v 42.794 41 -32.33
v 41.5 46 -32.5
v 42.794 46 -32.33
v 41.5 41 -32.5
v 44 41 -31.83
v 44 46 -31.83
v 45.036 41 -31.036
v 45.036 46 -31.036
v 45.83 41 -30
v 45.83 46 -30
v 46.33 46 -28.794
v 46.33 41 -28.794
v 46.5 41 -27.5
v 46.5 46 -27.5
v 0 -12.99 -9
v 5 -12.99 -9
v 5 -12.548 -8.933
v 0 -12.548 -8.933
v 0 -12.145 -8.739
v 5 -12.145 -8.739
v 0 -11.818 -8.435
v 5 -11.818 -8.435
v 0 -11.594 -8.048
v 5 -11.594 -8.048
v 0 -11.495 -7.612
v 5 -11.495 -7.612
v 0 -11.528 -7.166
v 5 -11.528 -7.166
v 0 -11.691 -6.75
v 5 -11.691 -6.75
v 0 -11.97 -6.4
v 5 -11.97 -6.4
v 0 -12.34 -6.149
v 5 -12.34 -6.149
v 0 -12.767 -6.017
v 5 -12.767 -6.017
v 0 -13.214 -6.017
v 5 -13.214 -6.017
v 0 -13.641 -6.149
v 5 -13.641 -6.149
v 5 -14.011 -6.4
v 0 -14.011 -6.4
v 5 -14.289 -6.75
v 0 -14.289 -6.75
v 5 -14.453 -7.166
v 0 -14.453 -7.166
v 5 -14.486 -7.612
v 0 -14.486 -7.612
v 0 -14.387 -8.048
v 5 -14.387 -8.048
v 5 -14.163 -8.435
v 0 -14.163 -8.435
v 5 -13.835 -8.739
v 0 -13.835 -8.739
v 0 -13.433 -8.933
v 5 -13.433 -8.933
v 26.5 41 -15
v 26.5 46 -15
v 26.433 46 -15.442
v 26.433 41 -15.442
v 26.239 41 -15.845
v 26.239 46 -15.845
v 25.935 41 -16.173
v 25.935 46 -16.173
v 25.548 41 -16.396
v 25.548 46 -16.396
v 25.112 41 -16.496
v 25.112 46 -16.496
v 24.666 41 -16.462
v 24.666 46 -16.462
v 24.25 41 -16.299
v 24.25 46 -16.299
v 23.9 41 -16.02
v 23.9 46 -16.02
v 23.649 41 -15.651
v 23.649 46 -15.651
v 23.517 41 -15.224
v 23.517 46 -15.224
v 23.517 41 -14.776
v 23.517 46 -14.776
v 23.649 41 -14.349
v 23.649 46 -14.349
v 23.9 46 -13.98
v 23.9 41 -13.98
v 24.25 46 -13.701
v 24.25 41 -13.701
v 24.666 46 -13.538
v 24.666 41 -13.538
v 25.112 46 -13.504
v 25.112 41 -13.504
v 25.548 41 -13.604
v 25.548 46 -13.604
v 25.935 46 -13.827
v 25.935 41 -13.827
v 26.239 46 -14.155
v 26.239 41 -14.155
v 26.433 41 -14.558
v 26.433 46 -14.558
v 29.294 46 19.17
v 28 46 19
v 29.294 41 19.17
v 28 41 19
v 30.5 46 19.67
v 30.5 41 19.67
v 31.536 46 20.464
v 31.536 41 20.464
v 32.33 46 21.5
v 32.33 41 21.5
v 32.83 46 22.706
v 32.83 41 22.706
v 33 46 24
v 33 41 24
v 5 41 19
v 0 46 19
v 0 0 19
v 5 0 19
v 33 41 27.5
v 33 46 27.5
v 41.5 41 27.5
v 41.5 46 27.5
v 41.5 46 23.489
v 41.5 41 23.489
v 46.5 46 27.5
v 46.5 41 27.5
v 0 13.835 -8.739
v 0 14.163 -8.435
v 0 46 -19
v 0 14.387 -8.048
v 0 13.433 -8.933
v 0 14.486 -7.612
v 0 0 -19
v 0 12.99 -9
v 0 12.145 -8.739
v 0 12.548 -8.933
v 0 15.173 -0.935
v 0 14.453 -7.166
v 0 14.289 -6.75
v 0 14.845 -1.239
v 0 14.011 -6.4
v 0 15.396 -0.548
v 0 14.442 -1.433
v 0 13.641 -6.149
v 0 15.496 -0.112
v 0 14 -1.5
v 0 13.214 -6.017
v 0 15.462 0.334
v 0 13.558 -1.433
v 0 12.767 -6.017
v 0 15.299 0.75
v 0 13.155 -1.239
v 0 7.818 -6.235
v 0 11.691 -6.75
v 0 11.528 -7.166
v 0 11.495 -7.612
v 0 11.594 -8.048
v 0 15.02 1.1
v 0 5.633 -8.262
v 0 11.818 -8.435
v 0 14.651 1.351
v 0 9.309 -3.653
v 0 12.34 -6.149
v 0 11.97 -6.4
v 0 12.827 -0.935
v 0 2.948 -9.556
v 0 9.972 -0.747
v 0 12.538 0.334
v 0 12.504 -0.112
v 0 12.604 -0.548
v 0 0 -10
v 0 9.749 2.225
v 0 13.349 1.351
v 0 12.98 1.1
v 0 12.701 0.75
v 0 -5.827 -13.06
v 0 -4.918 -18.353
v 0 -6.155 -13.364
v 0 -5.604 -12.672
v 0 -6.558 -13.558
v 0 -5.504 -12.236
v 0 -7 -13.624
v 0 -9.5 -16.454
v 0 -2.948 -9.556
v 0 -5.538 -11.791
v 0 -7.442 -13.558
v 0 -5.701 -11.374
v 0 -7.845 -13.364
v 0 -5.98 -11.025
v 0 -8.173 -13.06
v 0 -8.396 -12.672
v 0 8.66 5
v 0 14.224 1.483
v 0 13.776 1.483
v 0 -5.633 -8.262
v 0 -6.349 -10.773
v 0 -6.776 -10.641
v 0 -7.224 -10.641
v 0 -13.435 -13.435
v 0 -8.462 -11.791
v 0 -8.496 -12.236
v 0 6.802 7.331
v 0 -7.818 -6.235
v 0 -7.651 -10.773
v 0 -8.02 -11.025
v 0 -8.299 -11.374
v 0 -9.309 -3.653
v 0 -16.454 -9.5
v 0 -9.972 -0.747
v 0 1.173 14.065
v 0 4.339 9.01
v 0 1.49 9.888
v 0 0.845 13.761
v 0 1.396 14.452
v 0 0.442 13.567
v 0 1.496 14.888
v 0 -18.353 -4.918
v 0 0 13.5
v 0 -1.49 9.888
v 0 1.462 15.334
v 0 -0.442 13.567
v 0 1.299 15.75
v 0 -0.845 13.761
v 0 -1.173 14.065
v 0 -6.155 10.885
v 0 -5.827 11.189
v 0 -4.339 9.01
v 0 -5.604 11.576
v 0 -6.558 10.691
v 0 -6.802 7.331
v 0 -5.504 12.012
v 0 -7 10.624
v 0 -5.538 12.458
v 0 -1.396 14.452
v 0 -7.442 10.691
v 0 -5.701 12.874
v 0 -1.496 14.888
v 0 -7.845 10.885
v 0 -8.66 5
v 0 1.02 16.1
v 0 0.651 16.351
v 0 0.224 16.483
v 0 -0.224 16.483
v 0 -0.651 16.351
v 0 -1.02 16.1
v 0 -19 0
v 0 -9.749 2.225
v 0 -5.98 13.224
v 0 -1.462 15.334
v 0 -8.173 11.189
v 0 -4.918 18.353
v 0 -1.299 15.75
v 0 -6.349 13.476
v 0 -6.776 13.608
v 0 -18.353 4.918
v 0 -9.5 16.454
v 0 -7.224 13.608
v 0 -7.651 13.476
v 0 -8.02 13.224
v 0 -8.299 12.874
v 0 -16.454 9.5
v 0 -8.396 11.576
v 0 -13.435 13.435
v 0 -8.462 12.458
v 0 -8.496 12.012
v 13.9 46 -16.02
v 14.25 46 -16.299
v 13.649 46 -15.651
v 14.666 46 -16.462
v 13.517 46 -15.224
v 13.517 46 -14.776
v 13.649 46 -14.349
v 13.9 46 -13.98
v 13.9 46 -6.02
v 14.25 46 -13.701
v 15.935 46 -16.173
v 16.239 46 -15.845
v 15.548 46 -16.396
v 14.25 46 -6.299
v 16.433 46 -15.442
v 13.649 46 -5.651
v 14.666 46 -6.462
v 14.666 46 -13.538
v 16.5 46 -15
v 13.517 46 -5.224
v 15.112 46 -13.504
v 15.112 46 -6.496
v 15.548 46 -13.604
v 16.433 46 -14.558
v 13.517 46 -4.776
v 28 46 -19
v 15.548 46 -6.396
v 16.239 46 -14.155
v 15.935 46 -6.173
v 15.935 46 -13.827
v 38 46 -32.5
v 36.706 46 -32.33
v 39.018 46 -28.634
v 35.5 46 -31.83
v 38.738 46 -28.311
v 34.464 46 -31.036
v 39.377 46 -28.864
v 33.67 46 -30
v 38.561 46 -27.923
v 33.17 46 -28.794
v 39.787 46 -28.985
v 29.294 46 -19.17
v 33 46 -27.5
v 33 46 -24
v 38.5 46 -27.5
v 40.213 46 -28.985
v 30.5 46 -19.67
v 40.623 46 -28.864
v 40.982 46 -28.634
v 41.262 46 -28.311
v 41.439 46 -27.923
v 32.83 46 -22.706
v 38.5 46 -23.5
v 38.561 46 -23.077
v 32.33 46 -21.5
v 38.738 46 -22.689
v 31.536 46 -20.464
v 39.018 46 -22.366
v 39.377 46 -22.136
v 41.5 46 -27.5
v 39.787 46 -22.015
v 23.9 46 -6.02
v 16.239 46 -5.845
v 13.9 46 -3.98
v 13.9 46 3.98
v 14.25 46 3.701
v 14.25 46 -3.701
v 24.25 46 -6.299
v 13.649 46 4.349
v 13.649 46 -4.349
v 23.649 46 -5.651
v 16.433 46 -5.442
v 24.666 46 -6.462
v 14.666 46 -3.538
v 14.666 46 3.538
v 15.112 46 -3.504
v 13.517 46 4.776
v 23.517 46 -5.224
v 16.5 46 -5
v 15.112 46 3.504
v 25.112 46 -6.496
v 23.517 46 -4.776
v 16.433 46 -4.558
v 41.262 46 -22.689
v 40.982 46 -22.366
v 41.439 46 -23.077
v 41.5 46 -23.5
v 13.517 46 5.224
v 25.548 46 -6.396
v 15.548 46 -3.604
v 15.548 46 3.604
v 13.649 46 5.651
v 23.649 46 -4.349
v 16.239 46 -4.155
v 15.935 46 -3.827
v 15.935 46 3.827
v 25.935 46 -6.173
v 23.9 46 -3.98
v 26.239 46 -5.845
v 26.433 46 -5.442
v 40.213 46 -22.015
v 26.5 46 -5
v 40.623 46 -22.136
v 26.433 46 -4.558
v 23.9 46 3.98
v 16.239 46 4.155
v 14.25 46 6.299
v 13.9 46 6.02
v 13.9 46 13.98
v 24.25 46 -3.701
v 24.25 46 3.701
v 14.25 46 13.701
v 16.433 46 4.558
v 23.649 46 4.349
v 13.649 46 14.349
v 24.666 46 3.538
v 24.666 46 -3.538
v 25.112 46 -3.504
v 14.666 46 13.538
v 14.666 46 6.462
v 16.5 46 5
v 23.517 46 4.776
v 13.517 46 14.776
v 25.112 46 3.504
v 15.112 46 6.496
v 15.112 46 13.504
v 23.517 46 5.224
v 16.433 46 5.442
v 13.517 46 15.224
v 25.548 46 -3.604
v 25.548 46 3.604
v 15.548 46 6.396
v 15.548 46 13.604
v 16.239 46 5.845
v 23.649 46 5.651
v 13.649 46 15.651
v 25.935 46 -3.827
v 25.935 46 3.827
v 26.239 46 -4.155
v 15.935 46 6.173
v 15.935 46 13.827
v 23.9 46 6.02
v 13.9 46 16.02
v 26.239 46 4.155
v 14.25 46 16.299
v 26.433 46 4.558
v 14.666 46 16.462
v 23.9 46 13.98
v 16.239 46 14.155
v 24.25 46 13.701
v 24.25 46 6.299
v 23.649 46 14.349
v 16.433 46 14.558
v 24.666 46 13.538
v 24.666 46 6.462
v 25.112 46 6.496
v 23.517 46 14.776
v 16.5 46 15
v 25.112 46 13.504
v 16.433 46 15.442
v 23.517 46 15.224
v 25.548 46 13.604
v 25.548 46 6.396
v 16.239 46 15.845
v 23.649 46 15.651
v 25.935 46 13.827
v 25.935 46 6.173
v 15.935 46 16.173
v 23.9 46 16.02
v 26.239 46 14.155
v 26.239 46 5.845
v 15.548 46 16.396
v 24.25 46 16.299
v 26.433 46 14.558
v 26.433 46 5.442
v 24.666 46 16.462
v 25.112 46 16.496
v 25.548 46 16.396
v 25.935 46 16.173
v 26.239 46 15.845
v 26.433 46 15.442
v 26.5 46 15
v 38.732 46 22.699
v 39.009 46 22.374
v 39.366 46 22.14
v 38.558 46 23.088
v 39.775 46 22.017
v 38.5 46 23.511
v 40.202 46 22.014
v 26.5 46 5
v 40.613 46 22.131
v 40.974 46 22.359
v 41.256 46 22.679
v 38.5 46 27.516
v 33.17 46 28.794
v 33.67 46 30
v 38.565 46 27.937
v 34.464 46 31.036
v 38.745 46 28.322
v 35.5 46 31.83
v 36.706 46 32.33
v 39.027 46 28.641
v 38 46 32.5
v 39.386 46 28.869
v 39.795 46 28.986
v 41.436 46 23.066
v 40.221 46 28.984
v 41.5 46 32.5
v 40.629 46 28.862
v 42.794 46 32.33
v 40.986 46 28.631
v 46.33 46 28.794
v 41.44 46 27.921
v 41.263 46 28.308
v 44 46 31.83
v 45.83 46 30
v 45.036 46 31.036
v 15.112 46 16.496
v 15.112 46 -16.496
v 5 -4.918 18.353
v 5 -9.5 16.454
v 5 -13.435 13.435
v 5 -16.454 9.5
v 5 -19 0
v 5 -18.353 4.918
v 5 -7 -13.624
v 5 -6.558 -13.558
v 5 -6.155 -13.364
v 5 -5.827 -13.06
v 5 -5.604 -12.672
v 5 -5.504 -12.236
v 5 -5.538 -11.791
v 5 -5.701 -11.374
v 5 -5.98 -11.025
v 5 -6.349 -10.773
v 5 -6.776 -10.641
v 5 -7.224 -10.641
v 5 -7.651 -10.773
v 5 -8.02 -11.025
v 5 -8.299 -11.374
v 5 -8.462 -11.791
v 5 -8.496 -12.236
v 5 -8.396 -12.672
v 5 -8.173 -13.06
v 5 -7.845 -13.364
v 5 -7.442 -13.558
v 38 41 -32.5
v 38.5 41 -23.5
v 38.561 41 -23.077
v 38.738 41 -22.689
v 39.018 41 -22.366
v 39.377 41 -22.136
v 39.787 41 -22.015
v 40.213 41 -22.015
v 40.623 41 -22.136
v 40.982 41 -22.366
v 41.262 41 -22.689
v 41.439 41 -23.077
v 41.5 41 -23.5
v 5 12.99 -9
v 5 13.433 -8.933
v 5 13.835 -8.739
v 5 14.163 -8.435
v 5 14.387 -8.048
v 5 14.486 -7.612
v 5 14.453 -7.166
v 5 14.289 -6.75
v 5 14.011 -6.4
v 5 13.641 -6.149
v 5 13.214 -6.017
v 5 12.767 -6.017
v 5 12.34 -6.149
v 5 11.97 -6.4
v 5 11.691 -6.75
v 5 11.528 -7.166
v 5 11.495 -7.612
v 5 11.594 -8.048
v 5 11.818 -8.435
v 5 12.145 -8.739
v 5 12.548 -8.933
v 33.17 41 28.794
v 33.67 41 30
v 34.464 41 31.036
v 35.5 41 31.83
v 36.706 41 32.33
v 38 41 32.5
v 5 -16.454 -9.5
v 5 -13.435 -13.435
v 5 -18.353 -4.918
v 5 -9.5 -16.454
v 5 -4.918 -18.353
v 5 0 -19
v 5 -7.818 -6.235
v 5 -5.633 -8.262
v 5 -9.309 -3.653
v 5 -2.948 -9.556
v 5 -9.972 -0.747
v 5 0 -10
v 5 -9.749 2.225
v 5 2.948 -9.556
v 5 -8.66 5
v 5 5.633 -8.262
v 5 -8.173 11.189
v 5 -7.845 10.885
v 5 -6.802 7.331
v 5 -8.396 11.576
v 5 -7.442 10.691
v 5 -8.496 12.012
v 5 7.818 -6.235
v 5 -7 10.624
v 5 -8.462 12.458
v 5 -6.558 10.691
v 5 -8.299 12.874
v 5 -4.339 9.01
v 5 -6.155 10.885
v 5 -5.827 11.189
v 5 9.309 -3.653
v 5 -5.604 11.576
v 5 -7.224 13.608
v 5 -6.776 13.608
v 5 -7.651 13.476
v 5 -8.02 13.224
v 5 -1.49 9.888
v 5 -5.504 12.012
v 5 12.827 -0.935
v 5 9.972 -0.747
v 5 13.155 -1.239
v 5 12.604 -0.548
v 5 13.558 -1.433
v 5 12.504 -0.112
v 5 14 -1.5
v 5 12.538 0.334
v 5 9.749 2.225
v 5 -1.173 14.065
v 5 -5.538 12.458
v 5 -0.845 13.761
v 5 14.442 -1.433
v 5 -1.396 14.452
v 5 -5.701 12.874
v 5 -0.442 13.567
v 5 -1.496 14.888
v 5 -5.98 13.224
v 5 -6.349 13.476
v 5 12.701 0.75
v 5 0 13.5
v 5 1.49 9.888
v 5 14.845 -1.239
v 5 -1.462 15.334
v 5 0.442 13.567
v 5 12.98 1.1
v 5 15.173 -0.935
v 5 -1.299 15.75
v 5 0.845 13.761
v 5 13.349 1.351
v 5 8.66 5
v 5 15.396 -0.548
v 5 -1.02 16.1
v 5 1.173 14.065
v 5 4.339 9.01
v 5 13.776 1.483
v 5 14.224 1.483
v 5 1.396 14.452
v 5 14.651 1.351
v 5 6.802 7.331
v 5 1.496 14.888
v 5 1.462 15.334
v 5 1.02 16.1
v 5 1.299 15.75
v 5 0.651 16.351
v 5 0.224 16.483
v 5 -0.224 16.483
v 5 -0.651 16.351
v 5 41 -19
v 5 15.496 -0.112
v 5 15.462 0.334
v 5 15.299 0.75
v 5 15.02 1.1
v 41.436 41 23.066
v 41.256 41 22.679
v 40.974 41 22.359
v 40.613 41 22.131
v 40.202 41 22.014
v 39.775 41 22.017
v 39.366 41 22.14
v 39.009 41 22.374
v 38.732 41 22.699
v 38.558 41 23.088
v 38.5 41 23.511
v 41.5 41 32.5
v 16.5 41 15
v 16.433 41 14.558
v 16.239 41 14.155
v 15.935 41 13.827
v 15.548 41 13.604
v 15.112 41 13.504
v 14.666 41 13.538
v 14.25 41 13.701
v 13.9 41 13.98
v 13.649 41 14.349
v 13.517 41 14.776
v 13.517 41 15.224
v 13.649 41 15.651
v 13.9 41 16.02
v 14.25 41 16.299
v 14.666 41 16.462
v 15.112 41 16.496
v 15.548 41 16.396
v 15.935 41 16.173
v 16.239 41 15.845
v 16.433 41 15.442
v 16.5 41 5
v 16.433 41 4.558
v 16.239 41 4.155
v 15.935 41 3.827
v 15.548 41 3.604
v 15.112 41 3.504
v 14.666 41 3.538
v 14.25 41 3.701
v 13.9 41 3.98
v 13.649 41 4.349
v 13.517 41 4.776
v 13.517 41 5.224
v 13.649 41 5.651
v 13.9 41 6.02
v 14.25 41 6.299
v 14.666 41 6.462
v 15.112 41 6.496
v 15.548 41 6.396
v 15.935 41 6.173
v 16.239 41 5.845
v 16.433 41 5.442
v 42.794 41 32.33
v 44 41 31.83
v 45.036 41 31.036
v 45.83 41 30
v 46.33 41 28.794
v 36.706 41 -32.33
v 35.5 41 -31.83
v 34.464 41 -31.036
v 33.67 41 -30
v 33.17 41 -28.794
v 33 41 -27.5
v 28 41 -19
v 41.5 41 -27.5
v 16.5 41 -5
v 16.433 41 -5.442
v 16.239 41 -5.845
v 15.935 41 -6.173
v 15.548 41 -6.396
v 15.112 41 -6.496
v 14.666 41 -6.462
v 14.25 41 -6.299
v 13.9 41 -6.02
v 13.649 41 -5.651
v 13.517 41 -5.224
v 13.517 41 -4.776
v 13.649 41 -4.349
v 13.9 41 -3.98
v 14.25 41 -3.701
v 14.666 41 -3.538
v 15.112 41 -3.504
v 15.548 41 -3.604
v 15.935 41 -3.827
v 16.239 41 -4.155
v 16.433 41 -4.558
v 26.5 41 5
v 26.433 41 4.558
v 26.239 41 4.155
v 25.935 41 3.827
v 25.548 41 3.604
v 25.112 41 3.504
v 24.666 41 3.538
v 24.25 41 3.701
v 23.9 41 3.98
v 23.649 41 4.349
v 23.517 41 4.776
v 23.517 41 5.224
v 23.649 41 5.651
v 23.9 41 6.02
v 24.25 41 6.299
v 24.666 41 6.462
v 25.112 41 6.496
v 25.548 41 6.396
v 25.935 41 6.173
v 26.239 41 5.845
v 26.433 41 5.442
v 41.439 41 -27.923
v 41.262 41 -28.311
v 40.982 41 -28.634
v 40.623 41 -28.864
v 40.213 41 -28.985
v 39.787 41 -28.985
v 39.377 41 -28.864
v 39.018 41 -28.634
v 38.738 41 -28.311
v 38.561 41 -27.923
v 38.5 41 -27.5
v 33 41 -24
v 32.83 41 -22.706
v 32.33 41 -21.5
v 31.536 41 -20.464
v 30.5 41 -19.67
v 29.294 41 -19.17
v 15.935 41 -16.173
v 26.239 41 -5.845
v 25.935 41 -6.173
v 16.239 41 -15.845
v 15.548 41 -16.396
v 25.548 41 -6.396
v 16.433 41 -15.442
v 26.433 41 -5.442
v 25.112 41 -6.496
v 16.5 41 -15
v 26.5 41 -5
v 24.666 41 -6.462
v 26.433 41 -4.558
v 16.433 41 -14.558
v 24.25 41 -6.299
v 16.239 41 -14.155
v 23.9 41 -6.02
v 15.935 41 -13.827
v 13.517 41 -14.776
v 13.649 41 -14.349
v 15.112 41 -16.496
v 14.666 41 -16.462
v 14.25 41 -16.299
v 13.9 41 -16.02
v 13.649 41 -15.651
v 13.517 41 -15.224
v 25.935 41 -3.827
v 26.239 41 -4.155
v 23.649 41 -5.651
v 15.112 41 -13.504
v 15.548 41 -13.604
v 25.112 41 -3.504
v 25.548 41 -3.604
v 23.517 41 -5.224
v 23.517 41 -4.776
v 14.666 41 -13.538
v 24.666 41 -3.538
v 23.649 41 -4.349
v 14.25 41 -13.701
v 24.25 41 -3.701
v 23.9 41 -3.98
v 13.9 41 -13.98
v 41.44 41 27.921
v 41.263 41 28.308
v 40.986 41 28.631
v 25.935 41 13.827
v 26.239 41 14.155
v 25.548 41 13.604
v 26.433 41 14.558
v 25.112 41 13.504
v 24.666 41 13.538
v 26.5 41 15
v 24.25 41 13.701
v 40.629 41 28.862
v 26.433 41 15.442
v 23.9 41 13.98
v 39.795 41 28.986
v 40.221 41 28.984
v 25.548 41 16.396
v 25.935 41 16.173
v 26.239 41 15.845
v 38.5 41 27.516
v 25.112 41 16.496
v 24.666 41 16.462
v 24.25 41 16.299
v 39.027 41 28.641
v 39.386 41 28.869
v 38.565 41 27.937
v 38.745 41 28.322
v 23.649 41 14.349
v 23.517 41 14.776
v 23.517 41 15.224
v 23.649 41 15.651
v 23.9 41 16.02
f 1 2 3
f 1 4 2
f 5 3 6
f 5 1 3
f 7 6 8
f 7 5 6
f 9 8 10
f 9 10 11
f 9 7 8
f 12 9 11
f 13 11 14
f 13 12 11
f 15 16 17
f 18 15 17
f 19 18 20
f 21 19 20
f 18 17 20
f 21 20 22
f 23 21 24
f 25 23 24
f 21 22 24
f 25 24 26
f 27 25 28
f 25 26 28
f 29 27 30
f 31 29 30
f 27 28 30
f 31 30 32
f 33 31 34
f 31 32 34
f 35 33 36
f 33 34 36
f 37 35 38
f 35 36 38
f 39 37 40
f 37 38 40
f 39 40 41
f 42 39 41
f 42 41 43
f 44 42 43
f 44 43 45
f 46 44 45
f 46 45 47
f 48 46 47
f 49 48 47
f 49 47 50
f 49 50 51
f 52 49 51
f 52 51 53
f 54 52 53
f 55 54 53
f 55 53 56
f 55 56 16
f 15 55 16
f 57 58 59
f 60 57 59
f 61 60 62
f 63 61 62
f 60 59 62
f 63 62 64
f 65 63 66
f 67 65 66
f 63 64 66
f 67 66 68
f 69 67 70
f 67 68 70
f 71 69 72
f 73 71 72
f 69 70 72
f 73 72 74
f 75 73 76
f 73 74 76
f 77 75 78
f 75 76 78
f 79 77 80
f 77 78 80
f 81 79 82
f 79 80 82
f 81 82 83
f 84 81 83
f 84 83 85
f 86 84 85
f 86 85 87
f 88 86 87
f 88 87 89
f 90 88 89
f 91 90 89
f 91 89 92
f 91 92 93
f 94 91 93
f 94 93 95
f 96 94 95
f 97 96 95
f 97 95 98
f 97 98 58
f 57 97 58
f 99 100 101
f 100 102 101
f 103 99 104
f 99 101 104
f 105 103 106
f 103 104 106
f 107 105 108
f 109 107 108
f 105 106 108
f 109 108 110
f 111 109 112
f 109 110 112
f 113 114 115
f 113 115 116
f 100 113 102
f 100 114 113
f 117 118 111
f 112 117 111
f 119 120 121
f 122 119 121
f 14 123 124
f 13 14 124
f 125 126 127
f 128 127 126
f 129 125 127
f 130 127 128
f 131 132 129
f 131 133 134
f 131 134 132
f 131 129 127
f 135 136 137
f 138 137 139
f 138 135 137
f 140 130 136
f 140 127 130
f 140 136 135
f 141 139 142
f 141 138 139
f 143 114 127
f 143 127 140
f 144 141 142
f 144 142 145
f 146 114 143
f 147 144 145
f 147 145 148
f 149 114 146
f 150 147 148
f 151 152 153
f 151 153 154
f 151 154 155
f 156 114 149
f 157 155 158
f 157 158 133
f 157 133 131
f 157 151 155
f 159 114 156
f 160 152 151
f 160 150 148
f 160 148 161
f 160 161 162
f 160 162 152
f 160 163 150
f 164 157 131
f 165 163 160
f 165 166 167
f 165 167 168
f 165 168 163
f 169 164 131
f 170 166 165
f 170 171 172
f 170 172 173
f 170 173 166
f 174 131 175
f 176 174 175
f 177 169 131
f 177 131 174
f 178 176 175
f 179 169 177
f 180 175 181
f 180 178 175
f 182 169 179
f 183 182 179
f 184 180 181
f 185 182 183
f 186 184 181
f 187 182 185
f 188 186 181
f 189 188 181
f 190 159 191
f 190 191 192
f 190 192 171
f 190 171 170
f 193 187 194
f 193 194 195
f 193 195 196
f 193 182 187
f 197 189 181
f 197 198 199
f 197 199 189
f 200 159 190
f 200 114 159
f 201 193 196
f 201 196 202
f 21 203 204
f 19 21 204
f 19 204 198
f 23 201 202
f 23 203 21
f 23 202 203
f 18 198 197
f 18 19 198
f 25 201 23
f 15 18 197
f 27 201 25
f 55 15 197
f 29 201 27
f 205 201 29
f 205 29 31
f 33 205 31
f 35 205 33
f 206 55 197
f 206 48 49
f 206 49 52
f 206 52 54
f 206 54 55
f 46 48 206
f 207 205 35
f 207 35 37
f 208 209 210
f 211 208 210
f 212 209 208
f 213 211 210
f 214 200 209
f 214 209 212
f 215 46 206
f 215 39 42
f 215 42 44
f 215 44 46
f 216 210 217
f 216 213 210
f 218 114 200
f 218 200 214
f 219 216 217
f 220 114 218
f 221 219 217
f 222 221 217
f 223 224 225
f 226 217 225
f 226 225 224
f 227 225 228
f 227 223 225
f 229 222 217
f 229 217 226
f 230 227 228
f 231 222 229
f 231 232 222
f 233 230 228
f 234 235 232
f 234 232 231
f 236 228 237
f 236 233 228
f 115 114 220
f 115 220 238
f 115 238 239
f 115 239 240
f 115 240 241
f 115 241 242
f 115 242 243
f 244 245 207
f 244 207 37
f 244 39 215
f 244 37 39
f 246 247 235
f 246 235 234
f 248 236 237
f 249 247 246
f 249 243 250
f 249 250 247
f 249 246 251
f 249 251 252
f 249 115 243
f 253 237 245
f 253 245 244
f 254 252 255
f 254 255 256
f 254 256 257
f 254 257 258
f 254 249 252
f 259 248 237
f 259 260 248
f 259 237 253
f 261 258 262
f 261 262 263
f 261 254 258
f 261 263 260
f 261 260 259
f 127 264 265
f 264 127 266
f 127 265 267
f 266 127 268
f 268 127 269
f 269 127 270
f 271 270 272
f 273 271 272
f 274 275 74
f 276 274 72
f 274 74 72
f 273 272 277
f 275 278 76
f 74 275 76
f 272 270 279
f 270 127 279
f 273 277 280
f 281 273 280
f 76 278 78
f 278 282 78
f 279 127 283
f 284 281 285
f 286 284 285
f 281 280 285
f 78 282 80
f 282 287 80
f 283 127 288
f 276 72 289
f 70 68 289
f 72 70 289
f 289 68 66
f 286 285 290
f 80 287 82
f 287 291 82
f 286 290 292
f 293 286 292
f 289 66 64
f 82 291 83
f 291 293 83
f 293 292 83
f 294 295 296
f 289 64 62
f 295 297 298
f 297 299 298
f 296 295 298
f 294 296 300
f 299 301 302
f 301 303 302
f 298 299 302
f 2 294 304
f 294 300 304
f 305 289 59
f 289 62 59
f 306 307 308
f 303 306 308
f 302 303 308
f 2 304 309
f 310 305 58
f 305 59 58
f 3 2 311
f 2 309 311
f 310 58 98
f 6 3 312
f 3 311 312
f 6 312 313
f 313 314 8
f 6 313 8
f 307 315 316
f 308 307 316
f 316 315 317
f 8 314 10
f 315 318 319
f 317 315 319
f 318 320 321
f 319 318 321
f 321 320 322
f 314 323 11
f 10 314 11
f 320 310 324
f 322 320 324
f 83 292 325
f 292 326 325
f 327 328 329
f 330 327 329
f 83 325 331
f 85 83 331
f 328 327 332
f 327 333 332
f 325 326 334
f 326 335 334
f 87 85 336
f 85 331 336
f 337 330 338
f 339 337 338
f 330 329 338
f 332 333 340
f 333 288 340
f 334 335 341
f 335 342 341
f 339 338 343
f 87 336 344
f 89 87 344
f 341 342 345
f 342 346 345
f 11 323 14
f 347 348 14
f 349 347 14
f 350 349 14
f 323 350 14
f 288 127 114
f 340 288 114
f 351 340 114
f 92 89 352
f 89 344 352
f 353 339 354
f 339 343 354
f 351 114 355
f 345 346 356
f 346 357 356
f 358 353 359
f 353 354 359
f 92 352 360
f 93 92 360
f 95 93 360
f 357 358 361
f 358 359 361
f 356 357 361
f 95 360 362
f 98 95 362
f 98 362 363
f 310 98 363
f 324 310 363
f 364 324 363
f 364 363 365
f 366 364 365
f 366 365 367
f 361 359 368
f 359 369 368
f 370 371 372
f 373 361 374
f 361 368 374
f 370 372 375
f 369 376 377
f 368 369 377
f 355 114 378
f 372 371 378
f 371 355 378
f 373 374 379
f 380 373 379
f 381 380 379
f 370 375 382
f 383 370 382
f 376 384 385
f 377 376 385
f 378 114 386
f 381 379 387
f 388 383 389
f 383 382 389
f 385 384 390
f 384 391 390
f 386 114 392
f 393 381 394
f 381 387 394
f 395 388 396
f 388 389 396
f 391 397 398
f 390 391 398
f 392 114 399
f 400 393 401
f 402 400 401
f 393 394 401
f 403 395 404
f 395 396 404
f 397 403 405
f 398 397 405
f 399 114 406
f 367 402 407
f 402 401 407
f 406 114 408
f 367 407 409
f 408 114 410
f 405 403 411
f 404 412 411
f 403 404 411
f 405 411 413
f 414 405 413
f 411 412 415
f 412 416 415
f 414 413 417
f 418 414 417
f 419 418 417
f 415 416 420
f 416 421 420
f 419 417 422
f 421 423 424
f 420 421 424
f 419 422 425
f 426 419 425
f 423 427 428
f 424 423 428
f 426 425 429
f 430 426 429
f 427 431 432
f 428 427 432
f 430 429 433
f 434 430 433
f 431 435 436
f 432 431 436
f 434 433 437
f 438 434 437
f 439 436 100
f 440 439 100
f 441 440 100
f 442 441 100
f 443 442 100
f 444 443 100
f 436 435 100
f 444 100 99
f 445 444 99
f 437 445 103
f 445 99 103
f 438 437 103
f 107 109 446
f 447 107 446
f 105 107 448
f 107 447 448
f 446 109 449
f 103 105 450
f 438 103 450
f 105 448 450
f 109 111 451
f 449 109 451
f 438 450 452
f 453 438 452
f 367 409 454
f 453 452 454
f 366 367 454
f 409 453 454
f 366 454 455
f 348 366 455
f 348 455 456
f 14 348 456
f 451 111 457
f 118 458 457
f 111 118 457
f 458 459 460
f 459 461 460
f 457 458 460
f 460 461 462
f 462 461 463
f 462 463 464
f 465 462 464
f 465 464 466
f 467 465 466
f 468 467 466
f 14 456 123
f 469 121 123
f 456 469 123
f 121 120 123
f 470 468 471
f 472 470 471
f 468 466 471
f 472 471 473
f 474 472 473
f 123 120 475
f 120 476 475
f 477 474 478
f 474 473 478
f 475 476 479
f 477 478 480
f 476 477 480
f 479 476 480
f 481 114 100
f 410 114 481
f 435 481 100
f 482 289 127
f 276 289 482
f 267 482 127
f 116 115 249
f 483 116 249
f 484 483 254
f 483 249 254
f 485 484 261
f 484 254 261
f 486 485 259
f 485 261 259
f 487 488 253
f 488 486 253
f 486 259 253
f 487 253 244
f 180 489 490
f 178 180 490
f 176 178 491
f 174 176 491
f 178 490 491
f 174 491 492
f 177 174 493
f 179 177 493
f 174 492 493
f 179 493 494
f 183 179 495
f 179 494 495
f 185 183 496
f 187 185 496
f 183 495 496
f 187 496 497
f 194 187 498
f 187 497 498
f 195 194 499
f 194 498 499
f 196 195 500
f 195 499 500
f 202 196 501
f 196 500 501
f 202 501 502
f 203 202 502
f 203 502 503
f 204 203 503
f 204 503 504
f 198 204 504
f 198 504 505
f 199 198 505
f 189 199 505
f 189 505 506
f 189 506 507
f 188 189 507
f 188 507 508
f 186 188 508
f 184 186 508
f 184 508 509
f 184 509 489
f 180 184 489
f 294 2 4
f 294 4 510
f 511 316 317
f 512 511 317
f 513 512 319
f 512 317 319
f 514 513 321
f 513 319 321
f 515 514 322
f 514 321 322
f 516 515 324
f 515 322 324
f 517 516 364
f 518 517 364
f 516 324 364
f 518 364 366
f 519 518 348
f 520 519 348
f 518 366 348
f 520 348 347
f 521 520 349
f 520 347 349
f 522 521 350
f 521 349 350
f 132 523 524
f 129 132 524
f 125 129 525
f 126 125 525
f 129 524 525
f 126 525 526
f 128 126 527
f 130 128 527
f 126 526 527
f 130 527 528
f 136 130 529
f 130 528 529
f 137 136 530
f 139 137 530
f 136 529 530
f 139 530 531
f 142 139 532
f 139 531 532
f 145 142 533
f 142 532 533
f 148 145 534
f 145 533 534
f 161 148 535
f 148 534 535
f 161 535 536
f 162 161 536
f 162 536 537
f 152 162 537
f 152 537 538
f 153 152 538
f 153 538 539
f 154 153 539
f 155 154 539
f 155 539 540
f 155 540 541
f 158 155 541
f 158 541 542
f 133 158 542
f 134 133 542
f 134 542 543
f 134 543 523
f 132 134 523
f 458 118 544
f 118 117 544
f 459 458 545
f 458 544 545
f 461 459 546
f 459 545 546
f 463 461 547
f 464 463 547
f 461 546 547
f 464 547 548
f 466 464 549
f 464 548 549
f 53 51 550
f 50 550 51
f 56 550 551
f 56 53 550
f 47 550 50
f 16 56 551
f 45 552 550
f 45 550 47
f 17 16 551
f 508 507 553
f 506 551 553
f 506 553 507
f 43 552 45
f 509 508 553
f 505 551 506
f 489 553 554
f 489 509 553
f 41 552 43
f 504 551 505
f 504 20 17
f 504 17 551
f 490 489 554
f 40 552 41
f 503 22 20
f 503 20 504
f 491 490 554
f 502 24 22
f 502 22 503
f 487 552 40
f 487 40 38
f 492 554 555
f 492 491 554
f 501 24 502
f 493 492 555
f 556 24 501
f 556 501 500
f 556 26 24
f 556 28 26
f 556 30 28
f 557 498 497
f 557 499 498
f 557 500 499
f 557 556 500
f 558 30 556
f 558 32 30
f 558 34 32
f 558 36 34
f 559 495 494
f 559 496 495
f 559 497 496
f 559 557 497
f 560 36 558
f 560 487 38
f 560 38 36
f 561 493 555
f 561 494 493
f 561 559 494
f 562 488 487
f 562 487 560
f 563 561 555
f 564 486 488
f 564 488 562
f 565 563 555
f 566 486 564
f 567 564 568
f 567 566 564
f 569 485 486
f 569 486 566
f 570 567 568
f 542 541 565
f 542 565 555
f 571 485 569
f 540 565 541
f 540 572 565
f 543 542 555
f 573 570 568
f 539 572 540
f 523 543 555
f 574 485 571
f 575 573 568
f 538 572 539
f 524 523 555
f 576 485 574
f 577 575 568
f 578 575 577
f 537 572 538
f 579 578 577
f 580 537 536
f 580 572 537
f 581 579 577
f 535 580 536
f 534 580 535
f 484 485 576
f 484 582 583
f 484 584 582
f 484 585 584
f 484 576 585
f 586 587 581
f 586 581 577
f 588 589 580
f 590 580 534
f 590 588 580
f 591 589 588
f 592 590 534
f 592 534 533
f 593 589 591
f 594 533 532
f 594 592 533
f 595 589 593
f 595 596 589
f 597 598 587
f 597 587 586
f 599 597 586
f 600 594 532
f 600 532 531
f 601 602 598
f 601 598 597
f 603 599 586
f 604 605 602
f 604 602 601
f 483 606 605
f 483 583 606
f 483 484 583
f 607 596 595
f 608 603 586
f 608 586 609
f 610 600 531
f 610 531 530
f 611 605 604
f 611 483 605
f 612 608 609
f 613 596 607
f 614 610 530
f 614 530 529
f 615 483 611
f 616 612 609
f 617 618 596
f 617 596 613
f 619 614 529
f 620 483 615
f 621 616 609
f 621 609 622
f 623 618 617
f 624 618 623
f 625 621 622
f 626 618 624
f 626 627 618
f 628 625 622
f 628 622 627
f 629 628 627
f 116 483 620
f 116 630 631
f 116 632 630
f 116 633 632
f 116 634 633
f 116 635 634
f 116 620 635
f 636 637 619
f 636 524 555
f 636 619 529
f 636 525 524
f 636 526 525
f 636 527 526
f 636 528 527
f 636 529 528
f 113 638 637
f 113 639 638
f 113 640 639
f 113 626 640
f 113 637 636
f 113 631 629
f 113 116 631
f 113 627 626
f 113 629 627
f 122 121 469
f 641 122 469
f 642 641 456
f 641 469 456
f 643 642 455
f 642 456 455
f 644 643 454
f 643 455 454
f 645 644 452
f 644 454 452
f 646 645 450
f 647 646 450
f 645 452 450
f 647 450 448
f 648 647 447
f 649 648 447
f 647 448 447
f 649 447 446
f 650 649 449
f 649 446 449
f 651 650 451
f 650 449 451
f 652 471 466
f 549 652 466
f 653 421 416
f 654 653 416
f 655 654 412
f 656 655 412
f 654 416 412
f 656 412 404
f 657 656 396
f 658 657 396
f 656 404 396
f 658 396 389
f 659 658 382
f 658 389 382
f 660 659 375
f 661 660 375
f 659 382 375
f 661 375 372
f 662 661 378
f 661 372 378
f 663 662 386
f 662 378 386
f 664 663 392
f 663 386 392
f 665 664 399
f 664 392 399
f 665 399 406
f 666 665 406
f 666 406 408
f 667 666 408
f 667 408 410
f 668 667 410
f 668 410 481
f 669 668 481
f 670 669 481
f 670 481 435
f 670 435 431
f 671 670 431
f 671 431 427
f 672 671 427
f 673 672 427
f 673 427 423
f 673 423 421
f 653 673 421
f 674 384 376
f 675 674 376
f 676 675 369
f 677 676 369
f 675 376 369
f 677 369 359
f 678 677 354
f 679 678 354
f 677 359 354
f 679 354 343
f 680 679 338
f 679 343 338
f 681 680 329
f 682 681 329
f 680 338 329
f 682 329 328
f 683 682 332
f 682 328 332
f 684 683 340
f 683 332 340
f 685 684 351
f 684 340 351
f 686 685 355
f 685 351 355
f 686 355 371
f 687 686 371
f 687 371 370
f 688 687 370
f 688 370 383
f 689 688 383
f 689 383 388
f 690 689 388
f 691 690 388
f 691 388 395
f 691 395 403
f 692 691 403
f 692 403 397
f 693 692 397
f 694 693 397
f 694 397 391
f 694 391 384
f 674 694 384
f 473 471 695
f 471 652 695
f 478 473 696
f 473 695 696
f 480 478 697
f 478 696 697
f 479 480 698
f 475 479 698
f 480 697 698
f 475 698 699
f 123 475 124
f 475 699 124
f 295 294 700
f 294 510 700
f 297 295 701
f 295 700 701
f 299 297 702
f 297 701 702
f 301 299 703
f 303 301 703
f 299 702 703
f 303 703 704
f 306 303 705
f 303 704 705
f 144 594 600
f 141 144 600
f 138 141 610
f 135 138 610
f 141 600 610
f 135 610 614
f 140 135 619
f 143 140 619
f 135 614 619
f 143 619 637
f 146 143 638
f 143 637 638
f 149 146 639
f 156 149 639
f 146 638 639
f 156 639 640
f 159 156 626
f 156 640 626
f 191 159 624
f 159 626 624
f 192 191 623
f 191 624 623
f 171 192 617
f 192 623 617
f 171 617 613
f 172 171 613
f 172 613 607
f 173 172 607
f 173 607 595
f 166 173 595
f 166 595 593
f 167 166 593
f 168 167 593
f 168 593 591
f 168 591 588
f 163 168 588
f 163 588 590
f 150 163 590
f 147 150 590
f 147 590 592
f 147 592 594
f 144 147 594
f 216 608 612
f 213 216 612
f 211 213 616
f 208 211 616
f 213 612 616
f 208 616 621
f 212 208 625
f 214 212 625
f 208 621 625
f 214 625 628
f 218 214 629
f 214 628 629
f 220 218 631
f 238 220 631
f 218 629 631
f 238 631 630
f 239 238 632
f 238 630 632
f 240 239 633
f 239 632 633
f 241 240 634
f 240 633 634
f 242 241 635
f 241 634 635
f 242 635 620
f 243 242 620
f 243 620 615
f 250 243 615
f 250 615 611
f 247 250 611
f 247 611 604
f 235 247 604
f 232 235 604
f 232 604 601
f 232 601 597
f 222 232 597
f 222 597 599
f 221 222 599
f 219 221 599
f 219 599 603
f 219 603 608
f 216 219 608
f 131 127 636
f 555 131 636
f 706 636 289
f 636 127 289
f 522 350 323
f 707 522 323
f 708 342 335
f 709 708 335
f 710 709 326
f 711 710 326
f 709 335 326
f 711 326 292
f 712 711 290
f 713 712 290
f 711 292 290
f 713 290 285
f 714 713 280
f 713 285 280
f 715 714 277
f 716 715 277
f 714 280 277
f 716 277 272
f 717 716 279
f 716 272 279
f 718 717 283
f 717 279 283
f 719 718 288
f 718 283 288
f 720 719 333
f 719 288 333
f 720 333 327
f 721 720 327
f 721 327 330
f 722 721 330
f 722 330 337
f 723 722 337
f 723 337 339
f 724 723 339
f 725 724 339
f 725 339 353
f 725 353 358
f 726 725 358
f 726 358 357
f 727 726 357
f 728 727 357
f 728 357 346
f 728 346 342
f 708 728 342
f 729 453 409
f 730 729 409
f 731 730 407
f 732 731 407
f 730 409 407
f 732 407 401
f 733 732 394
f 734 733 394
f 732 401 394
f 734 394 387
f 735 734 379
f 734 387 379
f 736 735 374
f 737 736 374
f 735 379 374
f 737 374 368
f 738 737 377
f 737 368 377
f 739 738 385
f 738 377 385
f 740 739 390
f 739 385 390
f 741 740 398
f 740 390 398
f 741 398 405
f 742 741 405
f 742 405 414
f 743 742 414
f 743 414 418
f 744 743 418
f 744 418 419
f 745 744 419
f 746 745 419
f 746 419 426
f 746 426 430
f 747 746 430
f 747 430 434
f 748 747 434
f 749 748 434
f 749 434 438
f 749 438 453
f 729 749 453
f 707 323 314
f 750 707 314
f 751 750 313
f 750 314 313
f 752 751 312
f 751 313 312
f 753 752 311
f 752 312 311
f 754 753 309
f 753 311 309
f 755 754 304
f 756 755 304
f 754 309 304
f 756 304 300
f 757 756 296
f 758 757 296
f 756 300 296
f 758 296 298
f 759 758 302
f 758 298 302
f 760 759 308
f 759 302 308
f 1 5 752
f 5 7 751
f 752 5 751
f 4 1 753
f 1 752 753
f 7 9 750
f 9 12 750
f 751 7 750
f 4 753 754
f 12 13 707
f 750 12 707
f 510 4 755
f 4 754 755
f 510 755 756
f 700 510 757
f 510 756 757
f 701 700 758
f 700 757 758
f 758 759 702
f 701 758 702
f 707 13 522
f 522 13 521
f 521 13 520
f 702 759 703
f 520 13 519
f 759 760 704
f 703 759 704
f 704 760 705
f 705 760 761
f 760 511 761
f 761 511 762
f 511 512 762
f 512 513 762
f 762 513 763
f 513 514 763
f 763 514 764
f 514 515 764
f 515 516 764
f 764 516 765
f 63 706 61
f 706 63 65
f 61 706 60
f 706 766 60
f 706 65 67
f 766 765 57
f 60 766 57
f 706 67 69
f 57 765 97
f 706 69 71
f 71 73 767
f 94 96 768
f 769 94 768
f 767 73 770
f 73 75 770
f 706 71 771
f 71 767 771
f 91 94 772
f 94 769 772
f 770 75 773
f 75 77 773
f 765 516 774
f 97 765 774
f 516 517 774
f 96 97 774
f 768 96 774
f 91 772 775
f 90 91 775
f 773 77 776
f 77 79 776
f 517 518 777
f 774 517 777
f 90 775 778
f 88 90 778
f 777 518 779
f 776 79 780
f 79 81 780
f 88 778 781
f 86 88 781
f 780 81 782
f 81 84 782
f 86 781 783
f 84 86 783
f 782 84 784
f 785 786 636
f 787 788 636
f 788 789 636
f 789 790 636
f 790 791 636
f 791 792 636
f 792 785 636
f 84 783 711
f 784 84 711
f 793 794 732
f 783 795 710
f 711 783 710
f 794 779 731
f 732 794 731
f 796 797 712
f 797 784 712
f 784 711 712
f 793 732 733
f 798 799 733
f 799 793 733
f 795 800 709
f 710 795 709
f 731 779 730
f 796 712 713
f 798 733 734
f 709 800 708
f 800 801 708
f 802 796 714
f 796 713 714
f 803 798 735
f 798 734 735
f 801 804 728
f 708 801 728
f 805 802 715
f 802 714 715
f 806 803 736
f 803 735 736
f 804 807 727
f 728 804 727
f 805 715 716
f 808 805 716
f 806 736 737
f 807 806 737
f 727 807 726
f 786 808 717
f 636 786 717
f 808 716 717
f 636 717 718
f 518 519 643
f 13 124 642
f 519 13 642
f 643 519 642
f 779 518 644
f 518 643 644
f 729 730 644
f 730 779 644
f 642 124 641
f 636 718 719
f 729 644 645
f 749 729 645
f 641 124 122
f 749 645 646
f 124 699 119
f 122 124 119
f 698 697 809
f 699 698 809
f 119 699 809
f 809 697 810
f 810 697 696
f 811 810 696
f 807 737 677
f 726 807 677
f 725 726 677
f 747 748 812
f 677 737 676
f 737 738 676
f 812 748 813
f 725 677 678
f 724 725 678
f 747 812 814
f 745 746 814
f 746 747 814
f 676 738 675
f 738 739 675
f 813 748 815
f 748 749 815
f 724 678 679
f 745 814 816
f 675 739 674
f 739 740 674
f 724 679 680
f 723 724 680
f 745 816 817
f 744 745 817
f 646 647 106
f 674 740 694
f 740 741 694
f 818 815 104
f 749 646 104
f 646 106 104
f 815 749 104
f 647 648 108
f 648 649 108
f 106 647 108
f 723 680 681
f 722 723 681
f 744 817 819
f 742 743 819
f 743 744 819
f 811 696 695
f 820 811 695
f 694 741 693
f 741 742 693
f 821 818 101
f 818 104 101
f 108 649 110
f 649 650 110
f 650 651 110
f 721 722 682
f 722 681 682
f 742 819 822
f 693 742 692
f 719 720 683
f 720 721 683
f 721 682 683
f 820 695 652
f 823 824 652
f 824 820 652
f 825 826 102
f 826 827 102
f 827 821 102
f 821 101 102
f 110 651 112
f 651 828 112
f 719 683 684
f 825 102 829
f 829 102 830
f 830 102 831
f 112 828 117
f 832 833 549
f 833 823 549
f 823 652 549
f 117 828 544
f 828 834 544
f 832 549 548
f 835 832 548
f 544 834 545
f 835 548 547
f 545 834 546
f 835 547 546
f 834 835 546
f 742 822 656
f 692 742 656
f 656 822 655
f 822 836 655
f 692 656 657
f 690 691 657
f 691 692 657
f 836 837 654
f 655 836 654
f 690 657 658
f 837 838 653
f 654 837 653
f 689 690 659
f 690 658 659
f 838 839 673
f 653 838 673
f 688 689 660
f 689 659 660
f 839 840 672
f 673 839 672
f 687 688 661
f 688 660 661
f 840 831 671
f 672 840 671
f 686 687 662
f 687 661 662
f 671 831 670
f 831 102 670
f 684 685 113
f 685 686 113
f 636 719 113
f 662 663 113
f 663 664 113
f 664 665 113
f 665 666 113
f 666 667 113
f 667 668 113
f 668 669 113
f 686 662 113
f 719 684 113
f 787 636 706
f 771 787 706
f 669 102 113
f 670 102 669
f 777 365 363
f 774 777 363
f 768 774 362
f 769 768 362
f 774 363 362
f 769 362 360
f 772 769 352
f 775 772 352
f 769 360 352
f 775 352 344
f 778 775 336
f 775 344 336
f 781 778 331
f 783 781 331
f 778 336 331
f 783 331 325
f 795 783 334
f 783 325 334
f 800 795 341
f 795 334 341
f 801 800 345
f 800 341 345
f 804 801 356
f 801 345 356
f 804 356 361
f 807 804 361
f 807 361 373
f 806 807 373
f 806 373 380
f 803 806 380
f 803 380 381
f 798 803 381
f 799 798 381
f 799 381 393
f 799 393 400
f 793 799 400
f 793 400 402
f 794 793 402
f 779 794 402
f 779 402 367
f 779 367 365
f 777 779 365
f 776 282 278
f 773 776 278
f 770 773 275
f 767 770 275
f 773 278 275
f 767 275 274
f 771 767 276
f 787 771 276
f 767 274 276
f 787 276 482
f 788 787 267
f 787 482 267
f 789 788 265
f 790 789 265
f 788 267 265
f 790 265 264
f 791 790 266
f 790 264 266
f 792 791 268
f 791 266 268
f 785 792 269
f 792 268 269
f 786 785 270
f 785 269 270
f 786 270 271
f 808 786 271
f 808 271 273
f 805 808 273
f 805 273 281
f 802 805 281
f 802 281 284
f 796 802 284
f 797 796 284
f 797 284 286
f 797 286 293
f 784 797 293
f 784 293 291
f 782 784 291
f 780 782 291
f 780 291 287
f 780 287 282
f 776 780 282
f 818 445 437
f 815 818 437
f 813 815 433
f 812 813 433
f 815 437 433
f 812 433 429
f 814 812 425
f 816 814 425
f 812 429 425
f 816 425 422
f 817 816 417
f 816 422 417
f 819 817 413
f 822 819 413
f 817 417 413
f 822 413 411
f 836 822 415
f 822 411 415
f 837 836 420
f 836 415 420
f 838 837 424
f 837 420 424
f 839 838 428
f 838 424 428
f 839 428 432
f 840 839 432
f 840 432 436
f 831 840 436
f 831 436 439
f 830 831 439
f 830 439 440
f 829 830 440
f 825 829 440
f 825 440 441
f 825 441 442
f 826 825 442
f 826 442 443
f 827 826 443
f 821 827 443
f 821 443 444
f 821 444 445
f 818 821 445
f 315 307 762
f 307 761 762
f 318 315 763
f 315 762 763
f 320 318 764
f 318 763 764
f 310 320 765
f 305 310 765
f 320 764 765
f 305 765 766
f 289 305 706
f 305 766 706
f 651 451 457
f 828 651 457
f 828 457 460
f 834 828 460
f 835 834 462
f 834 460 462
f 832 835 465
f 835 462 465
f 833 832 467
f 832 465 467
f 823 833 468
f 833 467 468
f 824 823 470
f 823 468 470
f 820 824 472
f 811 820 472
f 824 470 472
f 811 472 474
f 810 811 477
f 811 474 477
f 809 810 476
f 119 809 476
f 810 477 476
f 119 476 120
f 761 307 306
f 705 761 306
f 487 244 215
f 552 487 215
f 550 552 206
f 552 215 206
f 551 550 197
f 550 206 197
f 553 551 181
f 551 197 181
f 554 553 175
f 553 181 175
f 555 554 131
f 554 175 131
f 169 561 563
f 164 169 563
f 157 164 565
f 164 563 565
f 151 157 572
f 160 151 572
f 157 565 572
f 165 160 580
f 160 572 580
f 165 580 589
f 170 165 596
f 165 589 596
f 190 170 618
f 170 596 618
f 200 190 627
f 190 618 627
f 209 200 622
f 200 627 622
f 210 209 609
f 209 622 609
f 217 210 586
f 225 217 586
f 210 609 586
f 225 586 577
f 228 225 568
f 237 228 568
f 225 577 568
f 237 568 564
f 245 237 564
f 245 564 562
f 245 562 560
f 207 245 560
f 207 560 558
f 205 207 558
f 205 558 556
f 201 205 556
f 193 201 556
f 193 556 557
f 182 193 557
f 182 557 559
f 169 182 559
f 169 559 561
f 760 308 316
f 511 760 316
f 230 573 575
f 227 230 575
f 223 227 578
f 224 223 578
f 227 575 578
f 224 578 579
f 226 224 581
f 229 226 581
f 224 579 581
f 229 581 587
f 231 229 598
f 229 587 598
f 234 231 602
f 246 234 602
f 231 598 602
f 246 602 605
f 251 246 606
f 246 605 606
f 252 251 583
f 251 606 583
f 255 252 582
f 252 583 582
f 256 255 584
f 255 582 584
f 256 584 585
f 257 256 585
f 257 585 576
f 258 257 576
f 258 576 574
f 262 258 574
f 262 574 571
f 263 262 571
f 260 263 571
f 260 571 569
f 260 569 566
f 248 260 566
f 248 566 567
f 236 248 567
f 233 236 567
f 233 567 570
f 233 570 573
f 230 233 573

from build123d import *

# Parameters (mm, degrees)
SKETCH_1_W               = 5
SKETCH_1_H               = 19
EXTRUDE_1_DEPTH          = 32.5
EXTRUDE_1_DEPTH_BACK     = 32.5
SKETCH_2_R               = 10
CUT_EXTRUDE_1_DEPTH      = 19
SKETCH_3_R               = 1.5
CUT_EXTRUDE_2_DEPTH      = 6
SKETCH_4_R               = 1.5
CUT_EXTRUDE_3_DEPTH      = 66
CUT_EXTRUDE_4_DEPTH      = 1
CUT_EXTRUDE_4_DEPTH_BACK = 47.5
SKETCH_6_W               = 33
SKETCH_6_H               = 13.5
CUT_EXTRUDE_5_DEPTH      = 10
FILLET_3_R               = 5


with BuildPart() as part:
    # Эскиз1 → Бобышка-Вытянуть1 (new body, two sides)
    with BuildSketch(Plane.XY) as extrude_1_sk:
        Polygon((46.5, 41), (5, 41), (5, 0), (0, 0), (0, 46), (46.5, 46), align=None)
        with Locations((2.5, -9.5)):
            Rectangle(SKETCH_1_W, SKETCH_1_H)
    extrude(amount=EXTRUDE_1_DEPTH)
    extrude(extrude_1_sk.sketch, amount=-EXTRUDE_1_DEPTH_BACK)

    # Эскиз2 → Вырез-Вытянуть1 (cut)
    with BuildSketch(Plane(origin=(5, 0, 0), x_dir=(0, 0, -1), z_dir=(1, 0, 0))):
        Circle(SKETCH_2_R)
    extrude(amount=-CUT_EXTRUDE_1_DEPTH, mode=Mode.SUBTRACT)

    # Эскиз3 → Вырез-Вытянуть2 (cut, through all)
    with BuildSketch(Plane(origin=(5, 0, 0), x_dir=(0, 0, -1), z_dir=(1, 0, 0))):
        with Locations((0, 14)):
            Circle(SKETCH_3_R)
        with Locations((7.5, 12.990381057)):
            Circle(SKETCH_3_R)
        with Locations((12.124355653, -7)):
            Circle(SKETCH_3_R)
        with Locations((7.5, -12.990381057)):
            Circle(SKETCH_3_R)
        with Locations((-12.124355653, -7)):
            Circle(SKETCH_3_R)
        with Locations((-15, 0)):
            Circle(SKETCH_3_R)
    extrude(amount=-CUT_EXTRUDE_2_DEPTH, mode=Mode.SUBTRACT)

    # Эскиз4 → Вырез-Вытянуть3 (cut, through all)
    with BuildSketch(Plane(origin=(0, 46, 0), x_dir=(1, 0, 0), z_dir=(0, 1, 0))):
        with Locations((15, 15)):
            Circle(SKETCH_4_R)
        with Locations((15, 5)):
            Circle(SKETCH_4_R)
        with Locations((25, 5)):
            Circle(SKETCH_4_R)
        with Locations((25, 15)):
            Circle(SKETCH_4_R)
        with Locations((25, -15)):
            Circle(SKETCH_4_R)
        with Locations((25, -5)):
            Circle(SKETCH_4_R)
        with Locations((15, -5)):
            Circle(SKETCH_4_R)
        with Locations((15, -15)):
            Circle(SKETCH_4_R)
        with BuildLine():
            Line((38.5, 27.5), (38.5, 23.5))
            ThreePointArc((38.5, 23.5), (40, 22), (41.5, 23.5))
            Line((41.5, 23.5), (41.5, 27.5))
            ThreePointArc((41.5, 27.5), (40, 29), (38.5, 27.5))
        make_face()
        with BuildLine():
            Line((38.5, -23.511442769), (38.5, -27.516419302))
            ThreePointArc((38.5, -27.516419302), (40.008164842, -29.000022466), (41.5, -27.5))
            Line((41.5, -27.5), (41.5, -23.488557231))
            ThreePointArc((41.5, -23.488557231), (39.988557231, -22), (38.5, -23.511442769))
        make_face()
    extrude(amount=-CUT_EXTRUDE_3_DEPTH, mode=Mode.SUBTRACT)

    # Эскиз5 → Вырез-Вытянуть4 (cut, two sides)
    with BuildSketch(Plane.ZY) as cut_extrude_4_sk:
        with BuildLine():
            ThreePointArc((3e-08, -19), (-13.435028832, -13.435028853), (-19, 0))
            Line((-19, 0), (-19, 40))
            Line((-19, 40), (-32.5, 40))
            Line((-32.5, 40), (-32.5, -19))
            Line((-32.5, -19), (3e-08, -19))
        make_face()
        with BuildLine():
            Line((19, 40), (19, 0))
            ThreePointArc((19, 0), (13.435028853, -13.435028832), (3e-08, -19))
            Line((3e-08, -19), (32.5, -19))
            Line((32.5, -19), (32.5, 40))
            Line((32.5, 40), (19, 40))
        make_face()
        Polygon((32.5, -19), (3e-08, -19), (-32.5, -19), (-32.5, 40), (-39.097198646, 40), (-39.097198646, -21.281436411), (42.016942769, -21.281436411), (42.016942769, 40), (32.5, 40), align=None)
    extrude(amount=CUT_EXTRUDE_4_DEPTH, mode=Mode.SUBTRACT)
    extrude(cut_extrude_4_sk.sketch, amount=-CUT_EXTRUDE_4_DEPTH_BACK, mode=Mode.SUBTRACT)

    # Эскиз6 → Вырез-Вытянуть5 (cut)
    with BuildSketch(Plane(origin=(0, 46, 0), x_dir=(1, 0, 0), z_dir=(0, 1, 0))):
        with Locations((16.5, 25.75)):
            Rectangle(SKETCH_6_W, SKETCH_6_H)
        with Locations((16.5, -25.75)):
            Rectangle(SKETCH_6_W, SKETCH_6_H)
    extrude(amount=-CUT_EXTRUDE_5_DEPTH, mode=Mode.SUBTRACT)

    # Скругление3
    fillet_3_edges = [part.edges().sort_by_distance(p)[0] for p in [
        (46.5, 43.5, 32.5),
        (33, 43.5, 19),
        (33, 43.5, 32.5),
        (33, 43.5, -32.5),
        (33, 43.5, -19),
        (46.5, 43.5, -32.5),
    ]]
    fillet(fillet_3_edges, radius=FILLET_3_R)


solid = part.part
